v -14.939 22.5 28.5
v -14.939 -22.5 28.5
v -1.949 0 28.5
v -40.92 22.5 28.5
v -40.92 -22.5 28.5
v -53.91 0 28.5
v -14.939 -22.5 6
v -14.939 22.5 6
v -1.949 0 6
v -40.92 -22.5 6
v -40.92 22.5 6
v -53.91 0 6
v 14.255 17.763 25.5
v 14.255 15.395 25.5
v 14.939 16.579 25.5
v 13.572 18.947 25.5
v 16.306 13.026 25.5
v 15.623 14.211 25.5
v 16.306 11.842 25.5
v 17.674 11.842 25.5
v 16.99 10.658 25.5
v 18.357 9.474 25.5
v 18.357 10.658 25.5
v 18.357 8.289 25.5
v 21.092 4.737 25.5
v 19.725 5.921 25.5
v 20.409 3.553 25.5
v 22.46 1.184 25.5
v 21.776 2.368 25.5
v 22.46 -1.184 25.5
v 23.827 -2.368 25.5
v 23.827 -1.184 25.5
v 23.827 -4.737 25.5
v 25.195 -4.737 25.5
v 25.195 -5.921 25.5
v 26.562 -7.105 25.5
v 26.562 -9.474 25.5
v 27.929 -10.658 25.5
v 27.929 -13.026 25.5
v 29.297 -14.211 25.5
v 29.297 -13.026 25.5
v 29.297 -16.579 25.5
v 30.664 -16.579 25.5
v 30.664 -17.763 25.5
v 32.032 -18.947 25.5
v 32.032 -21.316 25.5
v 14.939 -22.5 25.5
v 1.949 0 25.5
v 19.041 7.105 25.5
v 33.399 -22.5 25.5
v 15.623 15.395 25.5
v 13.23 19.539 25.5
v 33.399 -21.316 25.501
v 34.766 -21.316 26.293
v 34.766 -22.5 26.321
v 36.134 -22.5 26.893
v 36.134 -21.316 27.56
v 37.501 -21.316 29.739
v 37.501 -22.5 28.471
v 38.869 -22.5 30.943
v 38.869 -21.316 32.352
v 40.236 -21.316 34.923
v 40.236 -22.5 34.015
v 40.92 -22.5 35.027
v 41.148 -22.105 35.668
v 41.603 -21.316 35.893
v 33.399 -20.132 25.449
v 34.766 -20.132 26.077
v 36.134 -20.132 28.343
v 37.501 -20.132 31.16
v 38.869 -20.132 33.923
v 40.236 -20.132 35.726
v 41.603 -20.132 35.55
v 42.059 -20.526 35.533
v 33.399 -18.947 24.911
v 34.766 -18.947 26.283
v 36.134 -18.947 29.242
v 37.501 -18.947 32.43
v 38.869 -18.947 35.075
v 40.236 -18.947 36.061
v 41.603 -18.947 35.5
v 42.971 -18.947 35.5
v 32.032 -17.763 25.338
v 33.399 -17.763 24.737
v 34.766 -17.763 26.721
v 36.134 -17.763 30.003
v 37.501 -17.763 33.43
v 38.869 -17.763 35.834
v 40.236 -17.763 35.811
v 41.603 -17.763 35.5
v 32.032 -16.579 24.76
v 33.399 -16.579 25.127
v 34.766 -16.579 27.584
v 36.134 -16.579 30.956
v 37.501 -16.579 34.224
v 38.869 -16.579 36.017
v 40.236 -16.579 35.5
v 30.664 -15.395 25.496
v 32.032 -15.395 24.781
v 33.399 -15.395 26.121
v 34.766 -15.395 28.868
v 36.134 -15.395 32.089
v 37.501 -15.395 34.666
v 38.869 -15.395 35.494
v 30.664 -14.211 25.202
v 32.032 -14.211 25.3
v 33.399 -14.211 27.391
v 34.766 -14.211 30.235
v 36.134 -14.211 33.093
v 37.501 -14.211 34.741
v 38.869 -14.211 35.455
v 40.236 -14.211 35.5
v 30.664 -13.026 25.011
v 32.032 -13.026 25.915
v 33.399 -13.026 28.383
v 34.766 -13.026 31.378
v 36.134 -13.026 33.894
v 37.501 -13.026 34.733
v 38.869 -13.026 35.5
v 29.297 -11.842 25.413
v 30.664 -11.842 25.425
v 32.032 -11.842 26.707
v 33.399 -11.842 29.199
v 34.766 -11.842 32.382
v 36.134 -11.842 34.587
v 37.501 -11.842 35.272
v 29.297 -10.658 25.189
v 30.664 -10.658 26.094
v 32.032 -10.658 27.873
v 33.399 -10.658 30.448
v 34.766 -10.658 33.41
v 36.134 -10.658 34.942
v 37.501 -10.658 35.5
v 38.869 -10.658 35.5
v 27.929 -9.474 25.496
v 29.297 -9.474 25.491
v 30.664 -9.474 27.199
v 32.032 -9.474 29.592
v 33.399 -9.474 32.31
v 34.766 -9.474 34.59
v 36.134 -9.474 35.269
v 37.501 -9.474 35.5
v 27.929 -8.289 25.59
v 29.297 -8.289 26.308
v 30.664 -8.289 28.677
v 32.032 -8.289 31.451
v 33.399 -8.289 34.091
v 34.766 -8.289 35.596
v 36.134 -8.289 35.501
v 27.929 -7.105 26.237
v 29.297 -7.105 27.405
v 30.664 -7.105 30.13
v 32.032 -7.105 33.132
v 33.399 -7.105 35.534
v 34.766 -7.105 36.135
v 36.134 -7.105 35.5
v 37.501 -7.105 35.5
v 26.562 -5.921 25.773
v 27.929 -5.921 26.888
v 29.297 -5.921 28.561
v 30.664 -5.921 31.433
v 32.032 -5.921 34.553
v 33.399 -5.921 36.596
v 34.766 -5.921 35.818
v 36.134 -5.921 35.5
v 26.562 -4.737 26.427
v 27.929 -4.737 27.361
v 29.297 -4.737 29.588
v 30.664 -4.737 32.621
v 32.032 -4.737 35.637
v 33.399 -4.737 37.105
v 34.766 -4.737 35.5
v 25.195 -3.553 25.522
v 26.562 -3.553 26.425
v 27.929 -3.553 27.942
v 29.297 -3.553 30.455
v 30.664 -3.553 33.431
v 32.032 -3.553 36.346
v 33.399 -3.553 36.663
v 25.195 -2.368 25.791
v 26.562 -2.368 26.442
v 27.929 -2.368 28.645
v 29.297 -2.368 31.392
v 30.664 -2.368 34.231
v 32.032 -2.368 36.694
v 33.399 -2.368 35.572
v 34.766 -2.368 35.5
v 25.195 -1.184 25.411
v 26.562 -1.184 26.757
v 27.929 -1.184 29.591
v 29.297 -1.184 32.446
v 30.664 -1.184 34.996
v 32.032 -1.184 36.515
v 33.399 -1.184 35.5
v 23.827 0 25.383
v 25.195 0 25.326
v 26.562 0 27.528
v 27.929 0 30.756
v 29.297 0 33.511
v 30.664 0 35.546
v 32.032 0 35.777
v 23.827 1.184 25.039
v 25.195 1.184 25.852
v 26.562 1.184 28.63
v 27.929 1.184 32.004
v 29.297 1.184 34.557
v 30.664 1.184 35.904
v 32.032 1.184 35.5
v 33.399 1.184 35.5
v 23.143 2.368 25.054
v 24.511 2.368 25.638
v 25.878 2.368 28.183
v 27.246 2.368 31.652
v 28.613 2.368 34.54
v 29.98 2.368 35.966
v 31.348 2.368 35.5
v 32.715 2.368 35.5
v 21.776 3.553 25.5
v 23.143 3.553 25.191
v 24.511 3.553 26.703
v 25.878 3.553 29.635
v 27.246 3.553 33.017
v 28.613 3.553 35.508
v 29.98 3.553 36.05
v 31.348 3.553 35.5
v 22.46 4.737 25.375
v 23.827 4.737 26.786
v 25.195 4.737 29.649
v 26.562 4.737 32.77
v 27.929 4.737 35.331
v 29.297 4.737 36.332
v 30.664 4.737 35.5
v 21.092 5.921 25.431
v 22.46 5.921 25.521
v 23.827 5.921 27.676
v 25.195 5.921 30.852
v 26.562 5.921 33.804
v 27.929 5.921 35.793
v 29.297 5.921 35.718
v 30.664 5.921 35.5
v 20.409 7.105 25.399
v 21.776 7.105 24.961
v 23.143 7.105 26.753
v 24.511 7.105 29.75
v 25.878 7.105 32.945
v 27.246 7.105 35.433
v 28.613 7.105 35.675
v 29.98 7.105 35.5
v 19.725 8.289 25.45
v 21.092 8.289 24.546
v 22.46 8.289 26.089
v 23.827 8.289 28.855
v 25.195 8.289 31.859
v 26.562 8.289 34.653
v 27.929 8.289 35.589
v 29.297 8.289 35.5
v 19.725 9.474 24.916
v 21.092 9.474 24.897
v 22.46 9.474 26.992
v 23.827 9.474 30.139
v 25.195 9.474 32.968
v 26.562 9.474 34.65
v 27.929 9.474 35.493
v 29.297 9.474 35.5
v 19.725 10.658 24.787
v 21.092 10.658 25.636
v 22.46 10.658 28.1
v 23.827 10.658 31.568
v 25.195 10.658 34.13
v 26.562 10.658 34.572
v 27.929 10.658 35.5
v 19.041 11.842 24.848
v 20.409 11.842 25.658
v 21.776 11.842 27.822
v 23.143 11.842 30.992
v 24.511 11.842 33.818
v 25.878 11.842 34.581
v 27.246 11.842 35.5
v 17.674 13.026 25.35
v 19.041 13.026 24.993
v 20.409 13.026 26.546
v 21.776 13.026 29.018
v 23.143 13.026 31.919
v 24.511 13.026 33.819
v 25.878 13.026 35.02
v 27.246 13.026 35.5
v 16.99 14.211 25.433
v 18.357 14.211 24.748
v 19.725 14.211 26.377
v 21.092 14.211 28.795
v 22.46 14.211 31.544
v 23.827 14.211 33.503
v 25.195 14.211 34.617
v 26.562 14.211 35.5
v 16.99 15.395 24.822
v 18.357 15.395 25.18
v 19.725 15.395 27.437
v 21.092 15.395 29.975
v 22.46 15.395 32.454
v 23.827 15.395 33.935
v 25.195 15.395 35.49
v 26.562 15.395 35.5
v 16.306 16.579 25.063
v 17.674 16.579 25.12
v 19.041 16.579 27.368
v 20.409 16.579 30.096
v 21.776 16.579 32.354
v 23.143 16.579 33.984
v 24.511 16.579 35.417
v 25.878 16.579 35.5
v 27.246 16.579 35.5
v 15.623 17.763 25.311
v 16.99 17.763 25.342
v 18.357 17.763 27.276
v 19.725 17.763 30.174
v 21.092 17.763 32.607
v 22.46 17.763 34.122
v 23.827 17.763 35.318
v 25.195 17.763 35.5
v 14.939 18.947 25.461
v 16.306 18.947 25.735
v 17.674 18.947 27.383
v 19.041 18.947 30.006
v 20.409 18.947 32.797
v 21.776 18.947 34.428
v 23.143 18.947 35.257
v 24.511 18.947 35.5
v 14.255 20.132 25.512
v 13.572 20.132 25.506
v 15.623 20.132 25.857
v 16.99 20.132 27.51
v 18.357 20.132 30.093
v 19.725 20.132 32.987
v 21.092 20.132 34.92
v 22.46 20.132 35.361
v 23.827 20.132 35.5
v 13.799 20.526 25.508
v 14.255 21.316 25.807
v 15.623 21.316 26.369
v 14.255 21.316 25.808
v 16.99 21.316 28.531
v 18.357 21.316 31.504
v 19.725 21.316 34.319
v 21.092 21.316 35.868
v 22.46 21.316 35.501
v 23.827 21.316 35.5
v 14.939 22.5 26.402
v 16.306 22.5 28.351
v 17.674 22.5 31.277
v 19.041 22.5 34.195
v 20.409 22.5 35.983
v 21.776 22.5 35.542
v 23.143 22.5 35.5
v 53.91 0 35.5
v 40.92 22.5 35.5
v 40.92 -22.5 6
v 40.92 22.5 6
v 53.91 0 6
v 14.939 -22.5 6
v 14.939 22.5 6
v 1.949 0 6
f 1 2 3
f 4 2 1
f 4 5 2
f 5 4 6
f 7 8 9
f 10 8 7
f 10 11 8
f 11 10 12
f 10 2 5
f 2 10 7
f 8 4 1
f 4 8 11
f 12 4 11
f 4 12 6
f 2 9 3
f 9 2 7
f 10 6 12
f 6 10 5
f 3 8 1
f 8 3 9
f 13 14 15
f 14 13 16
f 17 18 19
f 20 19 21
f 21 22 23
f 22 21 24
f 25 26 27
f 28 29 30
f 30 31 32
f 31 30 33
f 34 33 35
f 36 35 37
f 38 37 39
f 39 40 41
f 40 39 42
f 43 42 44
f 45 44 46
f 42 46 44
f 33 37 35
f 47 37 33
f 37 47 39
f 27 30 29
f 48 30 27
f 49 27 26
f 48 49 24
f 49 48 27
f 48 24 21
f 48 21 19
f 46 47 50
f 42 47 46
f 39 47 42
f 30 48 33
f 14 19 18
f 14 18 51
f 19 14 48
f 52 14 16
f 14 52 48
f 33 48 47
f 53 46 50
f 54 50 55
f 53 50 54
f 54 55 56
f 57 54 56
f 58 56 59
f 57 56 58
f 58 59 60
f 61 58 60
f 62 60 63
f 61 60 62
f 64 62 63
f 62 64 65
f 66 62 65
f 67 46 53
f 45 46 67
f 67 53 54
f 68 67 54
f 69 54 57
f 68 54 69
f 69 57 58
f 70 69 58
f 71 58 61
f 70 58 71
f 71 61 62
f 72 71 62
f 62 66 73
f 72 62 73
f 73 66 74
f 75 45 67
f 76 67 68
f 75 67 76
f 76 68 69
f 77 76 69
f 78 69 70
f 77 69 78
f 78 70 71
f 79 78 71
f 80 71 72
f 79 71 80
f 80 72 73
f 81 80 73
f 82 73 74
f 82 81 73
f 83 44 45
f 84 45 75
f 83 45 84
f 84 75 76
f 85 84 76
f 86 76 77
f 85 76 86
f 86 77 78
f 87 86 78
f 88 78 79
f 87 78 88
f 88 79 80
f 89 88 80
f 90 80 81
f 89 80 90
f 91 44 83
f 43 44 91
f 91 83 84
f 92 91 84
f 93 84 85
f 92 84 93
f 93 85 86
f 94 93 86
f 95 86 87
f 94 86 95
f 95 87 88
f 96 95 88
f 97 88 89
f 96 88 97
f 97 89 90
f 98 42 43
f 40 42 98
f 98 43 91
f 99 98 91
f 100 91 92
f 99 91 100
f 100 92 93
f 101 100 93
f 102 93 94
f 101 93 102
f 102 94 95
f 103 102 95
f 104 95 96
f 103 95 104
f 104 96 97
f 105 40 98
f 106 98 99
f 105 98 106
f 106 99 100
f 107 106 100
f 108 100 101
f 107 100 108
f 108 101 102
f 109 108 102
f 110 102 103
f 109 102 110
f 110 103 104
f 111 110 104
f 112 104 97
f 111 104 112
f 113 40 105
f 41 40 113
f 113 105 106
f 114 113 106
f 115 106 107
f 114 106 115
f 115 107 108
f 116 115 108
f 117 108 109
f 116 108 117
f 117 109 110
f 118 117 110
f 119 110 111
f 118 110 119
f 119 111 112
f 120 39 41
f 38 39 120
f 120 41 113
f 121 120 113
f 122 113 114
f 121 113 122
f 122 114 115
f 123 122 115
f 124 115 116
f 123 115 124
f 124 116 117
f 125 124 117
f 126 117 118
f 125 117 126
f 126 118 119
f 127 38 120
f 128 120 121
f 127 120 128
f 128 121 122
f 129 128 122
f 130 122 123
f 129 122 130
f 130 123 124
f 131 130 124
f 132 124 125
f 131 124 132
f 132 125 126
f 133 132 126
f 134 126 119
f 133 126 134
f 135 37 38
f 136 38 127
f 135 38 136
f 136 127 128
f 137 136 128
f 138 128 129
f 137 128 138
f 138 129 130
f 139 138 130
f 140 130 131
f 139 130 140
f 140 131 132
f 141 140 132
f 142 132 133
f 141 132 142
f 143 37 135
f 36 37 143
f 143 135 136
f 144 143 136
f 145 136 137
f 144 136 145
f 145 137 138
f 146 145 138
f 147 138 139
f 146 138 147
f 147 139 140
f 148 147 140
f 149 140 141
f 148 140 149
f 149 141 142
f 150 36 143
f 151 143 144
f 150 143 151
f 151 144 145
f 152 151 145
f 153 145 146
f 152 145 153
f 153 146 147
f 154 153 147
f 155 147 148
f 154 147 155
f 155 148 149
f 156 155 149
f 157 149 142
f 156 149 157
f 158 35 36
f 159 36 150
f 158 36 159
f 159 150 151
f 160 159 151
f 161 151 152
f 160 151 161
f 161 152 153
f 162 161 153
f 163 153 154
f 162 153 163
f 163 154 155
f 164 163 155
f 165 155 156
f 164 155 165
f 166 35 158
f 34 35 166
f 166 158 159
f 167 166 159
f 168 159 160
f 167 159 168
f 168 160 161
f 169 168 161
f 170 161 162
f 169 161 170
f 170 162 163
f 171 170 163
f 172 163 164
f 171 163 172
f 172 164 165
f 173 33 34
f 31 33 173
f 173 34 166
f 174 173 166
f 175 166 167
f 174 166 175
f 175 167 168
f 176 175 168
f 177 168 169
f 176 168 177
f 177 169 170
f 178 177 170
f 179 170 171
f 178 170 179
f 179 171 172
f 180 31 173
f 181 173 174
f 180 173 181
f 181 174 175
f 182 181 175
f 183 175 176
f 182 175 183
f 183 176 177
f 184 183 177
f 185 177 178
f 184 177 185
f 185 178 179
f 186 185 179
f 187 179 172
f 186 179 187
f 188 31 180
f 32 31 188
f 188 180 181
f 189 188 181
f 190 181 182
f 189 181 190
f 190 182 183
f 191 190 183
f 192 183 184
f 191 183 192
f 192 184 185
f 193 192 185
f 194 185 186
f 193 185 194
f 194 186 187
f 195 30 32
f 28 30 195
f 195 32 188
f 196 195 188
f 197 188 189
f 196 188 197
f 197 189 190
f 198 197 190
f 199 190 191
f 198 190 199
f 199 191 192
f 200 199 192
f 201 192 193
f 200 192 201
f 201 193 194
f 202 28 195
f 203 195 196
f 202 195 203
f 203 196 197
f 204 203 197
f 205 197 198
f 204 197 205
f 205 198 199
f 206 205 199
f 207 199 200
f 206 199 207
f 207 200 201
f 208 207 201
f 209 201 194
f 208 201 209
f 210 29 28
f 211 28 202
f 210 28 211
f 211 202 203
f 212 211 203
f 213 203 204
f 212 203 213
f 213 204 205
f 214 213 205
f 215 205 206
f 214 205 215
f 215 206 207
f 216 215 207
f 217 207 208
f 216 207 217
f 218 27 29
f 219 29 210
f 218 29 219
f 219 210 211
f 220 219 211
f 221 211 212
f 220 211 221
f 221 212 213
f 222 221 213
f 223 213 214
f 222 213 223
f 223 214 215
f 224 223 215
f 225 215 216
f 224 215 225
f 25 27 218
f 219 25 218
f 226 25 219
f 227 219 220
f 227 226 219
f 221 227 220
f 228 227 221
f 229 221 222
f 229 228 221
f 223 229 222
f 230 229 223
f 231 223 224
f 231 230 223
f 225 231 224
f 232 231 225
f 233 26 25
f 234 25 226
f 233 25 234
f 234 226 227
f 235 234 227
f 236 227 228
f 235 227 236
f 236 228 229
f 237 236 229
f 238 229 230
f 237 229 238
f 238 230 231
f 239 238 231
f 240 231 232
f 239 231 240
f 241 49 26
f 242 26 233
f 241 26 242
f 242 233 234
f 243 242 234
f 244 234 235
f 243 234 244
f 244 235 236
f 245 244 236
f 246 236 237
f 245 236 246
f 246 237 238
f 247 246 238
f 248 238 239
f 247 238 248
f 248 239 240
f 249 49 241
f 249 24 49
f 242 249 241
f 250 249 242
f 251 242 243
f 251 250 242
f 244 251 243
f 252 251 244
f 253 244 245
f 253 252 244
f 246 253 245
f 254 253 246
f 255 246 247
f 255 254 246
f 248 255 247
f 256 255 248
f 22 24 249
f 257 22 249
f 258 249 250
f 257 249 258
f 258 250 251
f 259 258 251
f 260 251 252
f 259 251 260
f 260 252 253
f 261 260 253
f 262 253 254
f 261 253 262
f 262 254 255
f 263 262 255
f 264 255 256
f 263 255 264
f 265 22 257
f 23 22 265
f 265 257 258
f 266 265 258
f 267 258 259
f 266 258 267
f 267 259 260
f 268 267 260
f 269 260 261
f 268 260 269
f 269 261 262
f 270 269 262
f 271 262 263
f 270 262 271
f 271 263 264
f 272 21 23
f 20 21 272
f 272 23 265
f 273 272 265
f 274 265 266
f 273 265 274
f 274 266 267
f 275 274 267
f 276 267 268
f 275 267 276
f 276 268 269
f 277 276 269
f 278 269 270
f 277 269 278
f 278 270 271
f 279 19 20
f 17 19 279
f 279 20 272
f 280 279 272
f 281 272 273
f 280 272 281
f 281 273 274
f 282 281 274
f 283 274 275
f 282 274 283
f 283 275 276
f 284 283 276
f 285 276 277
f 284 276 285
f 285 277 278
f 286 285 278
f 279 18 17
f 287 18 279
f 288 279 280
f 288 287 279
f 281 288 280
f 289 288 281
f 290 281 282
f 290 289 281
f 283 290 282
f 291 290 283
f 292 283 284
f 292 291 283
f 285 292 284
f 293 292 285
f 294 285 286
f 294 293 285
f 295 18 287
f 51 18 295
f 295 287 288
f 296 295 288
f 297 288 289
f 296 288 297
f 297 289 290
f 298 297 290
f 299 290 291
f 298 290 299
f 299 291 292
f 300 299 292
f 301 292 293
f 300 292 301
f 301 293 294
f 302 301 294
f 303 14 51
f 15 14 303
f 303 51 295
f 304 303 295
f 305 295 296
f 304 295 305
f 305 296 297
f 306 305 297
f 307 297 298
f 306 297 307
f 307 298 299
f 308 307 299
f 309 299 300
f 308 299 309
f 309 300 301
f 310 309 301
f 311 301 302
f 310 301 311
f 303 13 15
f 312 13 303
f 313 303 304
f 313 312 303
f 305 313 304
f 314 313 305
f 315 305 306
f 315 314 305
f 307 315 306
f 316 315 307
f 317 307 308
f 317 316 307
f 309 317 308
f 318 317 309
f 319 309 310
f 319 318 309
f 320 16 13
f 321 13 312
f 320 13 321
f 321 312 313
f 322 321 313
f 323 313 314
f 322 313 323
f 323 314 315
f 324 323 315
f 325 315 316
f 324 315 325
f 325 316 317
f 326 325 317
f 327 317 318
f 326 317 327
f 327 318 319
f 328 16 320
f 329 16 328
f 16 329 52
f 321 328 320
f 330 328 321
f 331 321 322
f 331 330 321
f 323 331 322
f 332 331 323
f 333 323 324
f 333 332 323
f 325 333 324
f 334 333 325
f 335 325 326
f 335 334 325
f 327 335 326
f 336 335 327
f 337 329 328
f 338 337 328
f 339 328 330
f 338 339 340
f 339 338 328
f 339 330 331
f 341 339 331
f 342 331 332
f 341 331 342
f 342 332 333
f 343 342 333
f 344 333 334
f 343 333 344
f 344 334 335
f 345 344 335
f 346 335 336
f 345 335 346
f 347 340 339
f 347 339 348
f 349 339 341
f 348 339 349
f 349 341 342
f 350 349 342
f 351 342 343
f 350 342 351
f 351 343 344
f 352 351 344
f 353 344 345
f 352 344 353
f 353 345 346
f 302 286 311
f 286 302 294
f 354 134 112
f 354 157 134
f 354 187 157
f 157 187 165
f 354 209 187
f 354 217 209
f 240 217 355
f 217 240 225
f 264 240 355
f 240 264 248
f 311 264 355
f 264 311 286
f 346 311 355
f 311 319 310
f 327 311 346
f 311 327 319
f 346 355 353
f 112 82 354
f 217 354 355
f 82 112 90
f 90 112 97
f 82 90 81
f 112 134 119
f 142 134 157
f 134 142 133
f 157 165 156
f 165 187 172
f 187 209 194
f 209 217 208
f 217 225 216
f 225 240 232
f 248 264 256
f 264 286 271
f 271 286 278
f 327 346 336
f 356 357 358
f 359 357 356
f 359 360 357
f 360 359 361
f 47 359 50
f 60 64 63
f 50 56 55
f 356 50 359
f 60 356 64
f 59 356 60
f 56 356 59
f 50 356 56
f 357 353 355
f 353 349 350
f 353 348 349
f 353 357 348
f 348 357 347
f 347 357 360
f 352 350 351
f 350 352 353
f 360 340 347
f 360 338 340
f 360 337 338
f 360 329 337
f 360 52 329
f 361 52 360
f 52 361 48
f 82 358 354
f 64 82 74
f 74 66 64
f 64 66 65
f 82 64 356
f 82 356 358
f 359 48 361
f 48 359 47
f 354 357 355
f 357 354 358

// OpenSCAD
// demo_trihex_noise.scad
// Demo: fine triangle grid + world-aligned noise in a single hex.
//
// Open this file in OpenSCAD and render.

include <trihex_noise.scad>;

SCALE = 5.0;
HEX_R = 5.1961525;

scale(SCALE) {
  // Two hexes: left is standable-flat (no noise), right is stepped (noise only on slope band).
  spacing = HEX_R * 2.15;

  // Left: standable hex (perfectly flat, zero noise anywhere).
  translate([-spacing/2, 0, 0]) {
    color([0.75, 0.75, 0.75])
      hf_trihex_noise_solid(
        hex_r = HEX_R,
        world_xy = [-spacing/2, 0],
        tri_step = 0.28,
        base_z = 1.2,
        thickness = 3.5,
        noise = [14, 2.2, 5, 0.55, 2.05, 1337],
        z_quant = 0,
        macro = ["standable", 1.0],
        clip_height = 50
      );
  }

  // Right: stepped hex (a->b). Only the transition band gets detail noise.
  translate([spacing/2, 0, 0]) {
    // Step boundary is world-aligned so seams match across tiles.
    // Here we center the band on the local hex center: offset_world = dot(center,[cos,sin]).
    ang = 25;
    c = [spacing/2, 0];
    off = c[0] * cos(ang) + c[1] * sin(ang);

    color([0.75, 0.75, 0.75])
      hf_trihex_noise_solid(
        hex_r = HEX_R,
        world_xy = c,
        tri_step = 0.28,
        base_z = 1.2,
        thickness = 3.5,
        noise = [14, 2.2, 5, 0.55, 2.05, 1337],
        z_quant = 0,
        macro = ["step", 0.4, 2.4, 1.2, ang, off], // a, b, band_w, angle_deg, offset_world
        detail = [6, 0.16, 3, 0.55, 2.05, 4242],
        band_fade = 0.18,
        clip_height = 50
      );
  }
}
